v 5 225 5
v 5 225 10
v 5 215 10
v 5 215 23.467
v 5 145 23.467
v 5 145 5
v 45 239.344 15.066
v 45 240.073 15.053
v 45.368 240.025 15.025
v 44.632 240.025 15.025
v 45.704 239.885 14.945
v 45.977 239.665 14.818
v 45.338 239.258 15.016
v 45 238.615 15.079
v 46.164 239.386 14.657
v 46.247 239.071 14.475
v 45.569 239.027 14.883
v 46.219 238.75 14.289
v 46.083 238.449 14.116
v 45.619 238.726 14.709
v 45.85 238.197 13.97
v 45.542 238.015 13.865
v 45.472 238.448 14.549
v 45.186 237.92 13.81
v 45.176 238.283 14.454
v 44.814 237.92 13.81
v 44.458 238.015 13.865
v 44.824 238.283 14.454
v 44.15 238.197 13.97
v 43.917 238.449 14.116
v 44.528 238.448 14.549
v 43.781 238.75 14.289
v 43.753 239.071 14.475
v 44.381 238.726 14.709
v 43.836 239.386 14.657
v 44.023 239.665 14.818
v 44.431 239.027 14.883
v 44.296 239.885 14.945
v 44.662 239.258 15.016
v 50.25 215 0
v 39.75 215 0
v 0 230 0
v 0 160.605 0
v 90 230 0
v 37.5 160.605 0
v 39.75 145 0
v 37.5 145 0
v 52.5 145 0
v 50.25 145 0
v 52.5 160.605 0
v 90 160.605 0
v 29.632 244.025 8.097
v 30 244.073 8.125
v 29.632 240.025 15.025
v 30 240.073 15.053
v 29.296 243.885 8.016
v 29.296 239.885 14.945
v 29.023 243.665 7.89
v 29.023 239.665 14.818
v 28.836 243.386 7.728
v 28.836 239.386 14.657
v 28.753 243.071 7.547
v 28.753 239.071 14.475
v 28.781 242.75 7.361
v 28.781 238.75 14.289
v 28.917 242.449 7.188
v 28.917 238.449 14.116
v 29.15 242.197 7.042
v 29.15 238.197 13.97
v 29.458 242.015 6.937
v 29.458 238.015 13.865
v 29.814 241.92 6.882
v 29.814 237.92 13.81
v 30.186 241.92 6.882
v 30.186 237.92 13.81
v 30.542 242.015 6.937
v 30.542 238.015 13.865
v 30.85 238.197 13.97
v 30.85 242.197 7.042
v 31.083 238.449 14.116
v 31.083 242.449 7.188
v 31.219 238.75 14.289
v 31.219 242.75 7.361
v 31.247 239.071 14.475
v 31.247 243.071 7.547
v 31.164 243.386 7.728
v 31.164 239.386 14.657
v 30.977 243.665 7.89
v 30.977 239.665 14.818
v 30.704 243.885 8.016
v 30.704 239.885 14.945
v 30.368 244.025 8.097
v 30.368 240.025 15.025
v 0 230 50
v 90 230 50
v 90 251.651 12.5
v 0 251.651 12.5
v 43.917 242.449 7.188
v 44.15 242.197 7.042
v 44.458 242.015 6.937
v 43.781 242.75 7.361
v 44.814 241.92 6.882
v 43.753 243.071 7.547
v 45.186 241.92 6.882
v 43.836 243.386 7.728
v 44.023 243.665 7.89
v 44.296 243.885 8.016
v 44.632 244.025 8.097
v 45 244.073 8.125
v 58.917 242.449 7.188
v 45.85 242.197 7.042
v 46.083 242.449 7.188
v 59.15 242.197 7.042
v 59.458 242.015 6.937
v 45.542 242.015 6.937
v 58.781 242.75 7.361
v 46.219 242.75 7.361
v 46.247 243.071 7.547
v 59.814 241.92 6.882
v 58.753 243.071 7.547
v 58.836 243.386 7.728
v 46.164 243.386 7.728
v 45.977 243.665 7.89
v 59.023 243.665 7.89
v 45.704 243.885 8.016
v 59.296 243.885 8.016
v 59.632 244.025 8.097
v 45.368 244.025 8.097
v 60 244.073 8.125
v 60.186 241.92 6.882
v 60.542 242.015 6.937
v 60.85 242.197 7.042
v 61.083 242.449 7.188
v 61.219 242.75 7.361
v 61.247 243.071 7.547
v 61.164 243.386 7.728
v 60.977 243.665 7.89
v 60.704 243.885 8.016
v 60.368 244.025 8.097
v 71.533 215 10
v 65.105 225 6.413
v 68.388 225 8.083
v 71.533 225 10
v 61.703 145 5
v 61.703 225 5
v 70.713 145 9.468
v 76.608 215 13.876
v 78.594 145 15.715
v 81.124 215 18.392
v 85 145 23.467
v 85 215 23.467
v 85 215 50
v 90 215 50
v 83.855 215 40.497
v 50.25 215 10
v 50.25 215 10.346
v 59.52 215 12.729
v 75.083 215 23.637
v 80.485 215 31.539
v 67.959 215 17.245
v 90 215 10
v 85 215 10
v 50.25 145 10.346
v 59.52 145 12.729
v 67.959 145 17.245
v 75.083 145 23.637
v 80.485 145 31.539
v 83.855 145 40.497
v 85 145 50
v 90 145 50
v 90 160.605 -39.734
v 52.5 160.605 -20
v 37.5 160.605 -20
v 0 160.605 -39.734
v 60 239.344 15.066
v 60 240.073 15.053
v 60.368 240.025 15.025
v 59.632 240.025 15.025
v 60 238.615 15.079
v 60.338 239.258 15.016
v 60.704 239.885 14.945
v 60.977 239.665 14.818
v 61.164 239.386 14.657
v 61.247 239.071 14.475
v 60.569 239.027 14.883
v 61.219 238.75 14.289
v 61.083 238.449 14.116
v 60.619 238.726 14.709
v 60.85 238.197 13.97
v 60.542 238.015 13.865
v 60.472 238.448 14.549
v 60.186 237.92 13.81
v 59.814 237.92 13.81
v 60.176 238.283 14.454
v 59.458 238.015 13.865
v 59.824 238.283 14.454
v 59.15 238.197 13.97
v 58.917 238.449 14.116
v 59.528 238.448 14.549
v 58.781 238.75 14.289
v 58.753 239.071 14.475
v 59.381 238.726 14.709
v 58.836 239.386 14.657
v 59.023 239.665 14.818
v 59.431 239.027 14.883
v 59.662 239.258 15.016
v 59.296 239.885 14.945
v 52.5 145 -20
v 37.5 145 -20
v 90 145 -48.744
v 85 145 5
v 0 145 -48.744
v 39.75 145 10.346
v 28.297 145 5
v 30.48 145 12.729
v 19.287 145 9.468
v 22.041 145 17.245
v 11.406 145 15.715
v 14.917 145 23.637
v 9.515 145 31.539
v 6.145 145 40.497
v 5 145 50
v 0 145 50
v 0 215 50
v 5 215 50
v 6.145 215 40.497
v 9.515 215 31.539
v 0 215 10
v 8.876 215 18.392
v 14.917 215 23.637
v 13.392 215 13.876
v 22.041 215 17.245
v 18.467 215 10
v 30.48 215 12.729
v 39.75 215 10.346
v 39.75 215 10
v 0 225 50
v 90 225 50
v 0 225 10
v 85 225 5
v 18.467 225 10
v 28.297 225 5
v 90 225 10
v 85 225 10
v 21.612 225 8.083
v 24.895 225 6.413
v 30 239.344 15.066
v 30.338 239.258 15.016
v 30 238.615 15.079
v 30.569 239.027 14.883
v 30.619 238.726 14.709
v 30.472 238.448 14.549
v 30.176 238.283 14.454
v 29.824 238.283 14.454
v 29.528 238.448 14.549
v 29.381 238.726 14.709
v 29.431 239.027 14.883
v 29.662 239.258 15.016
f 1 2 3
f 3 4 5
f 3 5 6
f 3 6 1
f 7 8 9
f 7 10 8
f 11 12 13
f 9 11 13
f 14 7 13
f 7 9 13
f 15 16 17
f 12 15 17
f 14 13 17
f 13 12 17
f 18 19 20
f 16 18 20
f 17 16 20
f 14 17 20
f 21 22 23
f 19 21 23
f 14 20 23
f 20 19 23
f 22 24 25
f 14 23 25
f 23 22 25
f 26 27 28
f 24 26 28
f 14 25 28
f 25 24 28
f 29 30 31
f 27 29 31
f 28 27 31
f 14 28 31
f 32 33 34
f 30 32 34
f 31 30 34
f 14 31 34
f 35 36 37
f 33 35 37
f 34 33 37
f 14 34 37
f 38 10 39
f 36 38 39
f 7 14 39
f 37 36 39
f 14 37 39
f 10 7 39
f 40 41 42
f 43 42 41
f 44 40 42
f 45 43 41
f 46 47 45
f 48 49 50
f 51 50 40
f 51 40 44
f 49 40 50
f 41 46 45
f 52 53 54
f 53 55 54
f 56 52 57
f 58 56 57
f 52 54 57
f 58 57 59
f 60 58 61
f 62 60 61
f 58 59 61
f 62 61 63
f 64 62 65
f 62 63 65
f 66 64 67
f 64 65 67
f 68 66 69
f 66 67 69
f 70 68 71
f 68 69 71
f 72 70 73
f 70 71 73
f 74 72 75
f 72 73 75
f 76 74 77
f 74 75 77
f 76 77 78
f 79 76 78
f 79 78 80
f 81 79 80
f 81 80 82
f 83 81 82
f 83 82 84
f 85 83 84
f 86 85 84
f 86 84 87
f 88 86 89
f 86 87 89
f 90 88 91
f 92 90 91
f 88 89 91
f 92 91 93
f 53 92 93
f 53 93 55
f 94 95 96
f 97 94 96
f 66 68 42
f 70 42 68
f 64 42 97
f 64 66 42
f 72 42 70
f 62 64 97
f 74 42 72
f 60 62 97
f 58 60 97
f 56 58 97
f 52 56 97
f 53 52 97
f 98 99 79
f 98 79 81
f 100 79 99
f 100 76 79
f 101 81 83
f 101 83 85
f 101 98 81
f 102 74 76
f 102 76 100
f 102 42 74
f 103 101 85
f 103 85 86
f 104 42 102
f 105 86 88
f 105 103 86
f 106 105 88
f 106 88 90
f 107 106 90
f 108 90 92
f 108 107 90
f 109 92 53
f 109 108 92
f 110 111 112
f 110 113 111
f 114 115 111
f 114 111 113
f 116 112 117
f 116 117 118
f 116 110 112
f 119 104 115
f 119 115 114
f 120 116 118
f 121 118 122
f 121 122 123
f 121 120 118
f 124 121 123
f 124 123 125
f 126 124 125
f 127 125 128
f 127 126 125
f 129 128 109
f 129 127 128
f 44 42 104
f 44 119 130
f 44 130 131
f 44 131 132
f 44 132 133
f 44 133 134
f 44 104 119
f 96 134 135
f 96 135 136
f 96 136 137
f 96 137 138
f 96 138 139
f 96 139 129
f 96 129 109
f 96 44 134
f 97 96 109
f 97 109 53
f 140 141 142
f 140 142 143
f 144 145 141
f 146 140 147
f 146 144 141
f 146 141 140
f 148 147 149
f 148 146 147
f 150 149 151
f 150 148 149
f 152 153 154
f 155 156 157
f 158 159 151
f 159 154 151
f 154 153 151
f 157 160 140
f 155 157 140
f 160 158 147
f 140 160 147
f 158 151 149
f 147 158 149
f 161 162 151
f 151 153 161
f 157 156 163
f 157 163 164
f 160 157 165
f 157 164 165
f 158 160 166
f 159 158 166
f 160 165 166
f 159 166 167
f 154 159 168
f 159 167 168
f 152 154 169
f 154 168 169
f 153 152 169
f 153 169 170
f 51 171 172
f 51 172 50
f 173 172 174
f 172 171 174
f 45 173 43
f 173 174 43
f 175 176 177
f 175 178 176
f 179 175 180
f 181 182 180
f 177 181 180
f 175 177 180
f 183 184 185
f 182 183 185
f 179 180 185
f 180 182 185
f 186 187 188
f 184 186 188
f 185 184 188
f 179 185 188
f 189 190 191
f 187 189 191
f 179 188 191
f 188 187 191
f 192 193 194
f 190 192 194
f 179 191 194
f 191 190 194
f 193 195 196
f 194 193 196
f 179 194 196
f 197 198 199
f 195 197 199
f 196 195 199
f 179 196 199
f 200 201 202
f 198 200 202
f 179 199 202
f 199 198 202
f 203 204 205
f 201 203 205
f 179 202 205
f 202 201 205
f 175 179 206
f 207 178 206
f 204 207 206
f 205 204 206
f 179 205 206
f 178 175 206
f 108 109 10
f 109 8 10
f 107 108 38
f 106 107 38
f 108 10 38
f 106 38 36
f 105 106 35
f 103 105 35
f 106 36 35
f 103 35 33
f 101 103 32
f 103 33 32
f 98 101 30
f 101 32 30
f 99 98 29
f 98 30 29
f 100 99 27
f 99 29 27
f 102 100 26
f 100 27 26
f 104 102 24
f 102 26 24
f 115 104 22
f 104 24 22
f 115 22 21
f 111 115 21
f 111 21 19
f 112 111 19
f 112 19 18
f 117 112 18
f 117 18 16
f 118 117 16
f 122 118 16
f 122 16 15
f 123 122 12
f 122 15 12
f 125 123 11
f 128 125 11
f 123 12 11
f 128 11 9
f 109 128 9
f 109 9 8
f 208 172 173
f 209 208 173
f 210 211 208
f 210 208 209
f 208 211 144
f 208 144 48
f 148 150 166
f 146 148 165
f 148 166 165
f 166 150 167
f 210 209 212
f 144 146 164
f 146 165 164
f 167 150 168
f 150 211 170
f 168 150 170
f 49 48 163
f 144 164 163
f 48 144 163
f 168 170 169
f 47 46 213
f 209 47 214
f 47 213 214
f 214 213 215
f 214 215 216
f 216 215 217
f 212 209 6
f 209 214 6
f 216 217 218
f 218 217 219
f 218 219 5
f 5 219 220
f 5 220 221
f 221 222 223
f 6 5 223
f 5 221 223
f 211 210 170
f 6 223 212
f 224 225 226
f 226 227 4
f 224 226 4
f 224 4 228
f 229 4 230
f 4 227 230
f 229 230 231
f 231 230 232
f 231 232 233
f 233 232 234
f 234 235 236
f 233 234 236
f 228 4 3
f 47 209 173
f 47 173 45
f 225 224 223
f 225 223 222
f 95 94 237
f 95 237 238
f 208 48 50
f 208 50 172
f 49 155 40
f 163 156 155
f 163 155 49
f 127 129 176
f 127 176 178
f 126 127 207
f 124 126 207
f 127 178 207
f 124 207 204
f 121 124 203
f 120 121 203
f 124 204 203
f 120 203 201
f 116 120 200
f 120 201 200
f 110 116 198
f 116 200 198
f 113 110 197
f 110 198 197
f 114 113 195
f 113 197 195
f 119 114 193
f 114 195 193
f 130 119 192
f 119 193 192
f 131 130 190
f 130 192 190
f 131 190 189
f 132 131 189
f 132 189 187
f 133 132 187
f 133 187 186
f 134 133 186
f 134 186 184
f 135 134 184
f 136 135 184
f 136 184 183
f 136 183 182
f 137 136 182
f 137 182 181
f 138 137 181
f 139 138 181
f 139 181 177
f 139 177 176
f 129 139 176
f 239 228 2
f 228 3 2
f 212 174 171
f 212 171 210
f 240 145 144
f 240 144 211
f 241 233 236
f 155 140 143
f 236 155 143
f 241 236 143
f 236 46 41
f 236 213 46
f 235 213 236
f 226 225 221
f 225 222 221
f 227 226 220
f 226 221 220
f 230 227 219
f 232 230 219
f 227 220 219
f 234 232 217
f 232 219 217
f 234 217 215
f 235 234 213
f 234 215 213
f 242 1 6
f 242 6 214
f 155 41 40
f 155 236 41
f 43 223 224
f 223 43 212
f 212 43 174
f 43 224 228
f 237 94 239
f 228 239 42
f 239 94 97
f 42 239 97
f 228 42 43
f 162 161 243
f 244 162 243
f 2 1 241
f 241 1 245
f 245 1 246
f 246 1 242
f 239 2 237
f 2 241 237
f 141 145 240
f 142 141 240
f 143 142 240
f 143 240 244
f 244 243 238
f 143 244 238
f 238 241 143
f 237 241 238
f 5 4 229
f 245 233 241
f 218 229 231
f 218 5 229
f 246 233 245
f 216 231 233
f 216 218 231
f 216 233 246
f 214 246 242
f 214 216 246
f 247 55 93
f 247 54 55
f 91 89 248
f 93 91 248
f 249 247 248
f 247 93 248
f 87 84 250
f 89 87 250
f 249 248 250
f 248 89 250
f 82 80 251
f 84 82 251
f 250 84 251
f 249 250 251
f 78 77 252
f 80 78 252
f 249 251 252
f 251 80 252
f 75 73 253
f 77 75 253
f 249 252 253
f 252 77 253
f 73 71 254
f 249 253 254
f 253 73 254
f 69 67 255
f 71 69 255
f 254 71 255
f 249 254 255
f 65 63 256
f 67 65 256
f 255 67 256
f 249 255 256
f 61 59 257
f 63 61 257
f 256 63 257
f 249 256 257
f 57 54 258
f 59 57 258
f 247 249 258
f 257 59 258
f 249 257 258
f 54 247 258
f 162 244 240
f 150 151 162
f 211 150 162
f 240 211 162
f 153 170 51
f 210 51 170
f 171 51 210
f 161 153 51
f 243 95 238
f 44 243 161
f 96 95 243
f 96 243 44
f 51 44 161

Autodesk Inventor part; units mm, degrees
ref_plane "YZ Plane" through (0, 0, 0) normal (1, 0, 0) x (0, 1, 0)
ref_plane "XZ Plane" through (0, 0, 0) normal (0, 1, 0) x (-1, 0, 0)
ref_plane "XY Plane" through (0, 0, 0) normal (0, 0, 1) x (1, 0, 0)
sketch "スケッチ1" plane through (0, 0, 0) normal (0, 1, 0) x (-1, 0, 0)
  line L0 (0, 0) -> (-90, 0)
  line L1 (-90, 0) -> (-90, 50)
  line L2 (0, 50) -> (0, 0)
  line L3 (0, 0) -> (-5, 0)
  line L4 (-5, 0) -> (-5, 50)
  line L5 (-5, 0) -> (-90, 0)
  line L6 (-90, 0) -> (-85, 0)
  line L7 (-85, 0) -> (-85, 50)
  arc A0 (-85, 50) -> (-5, 50) centre (-45, 50) ccw
  line L8 (0, 0) -> (0, 10)
  line L9 (0, 10) -> (-90, 10)
  circle A1 centre (-45, 50) radius 45
  line L10 (-90, 5) -> (0, 5)
  line L11 (-90, 50) -> (-85, 50)
  line L12 (-5, 50) -> (0, 50)
  line L13 (0, 0) -> (-90, 0)
  line L14 (-90, 0) -> (-90, 5)
  line L15 (-90, 5) -> (0, 5)
  line L16 (0, 5) -> (0, 0)
  dimension "d0" = 90
  dimension "d1" = 50
  dimension "d2" = 5
  dimension "d3" = 85
  dimension "d4" = 5
  dimension "d5" = 80
  dimension "d6" = 10
  dimension "d7" = 90
extrude "押し出し1" add sketch "スケッチ1" along normal blind 230 contours L0 L4 L10 L2 | L0 L7 L10 L4 | L10 L4 L9 L2 | L0 L1 L10 L7 | L10 A1 L9 L4 | L9 L4 A1 L2 | L10 L1 L9 L7 | L7 L9 A1 L10 | L9 A1 L4 | A1 L9 | A1 L4 L12 | L9 L1 A1 L7 | L7 A1 L9 | A1 L9 A0 L4 | A1 L7 A0 L9 | L11 L7 A1
sketch "スケッチ2" plane through (0, 0, 0) normal (0, -1, 0) x (1, 0, 0)
  line L0 (0, 0) -> (0, 50) projected
  line L1 (90, 0) -> (0, 0) projected
  line L2 (90, 50) -> (90, 0) projected
  line L3 (85, 50) -> (90, 50) projected
  arc A0 (5, 50) -> (85, 50) centre (45, 50) ccw projected
  line L4 (0, 50) -> (5, 50) projected
  arc A1 (5, 23.467) -> (85, 23.467) centre (45, 50) ccw
  line L5 (0, 5) -> (90, 5)
  line L6 (5, 23.467) -> (5, 5)
  line L7 (85, 23.467) -> (85, 5)
  dimension "d29" = 48
extrude "押し出し2" cut sketch "スケッチ2" against normal blind 225 contours L6 A1 L5 | L5 A1 L7
sketch "スケッチ3" plane through (0, 230, 0) normal (0, 1, 0) x (1, 0, 0)
  arc A0 (85, -50) -> (5, -50) centre (45, -50) ccw projected
  line L0 (90, -50) -> (90, 0) projected
  line L1 (0, -50) -> (5, -50) projected
  arc A1 (85, -50) -> (5, -50) centre (45, -50) ccw
  line L2 (5, -50) -> (85, -50)
extrude "押し出し3" add sketch "スケッチ3" against normal blind 5
sketch "スケッチ4" plane through (90, 0, 50) normal (1, 0, 0) x (0, 0, -1)
  line L0 (0, 0) -> (50, 0) projected
  line L1 (0, 0) -> (0, 230) projected
  line L2 (25, 0) -> (25, 65)
  line L3 (25, 65) -> (25, 75)
  line L4 (25, 75) -> (25, 215)
  line L5 (25, 215) -> (25, 225)
  line L6 (0, 65) -> (40, 65)
  line L7 (40, 65) -> (40, 75)
  line L8 (40, 75) -> (0, 75)
  line L9 (0, 75) -> (0, 65)
  line L10 (0, 215) -> (40, 215)
  line L11 (40, 215) -> (40, 225)
  line L12 (40, 225) -> (0, 225)
  line L13 (0, 225) -> (0, 215)
  dimension "d16" = 65
  dimension "d17" = 10
  dimension "d18" = 140
  dimension "d19" = 10
  dimension "d20" = 40
extrude "押し出し4" cut sketch "スケッチ4" against normal blind 90 contours L1 L8 L3 L6 | L3 L8 L7 L6 | L1 L12 L5 L10 | L5 L12 L11 L10
sketch "スケッチ6" plane through (90, 0, 50) normal (1, 0, 0) x (0, 0, -1)
  line L0 (0, 230) -> (50, 230) projected
  line L1 (50, 230) -> (37.5, 251.6506)
  line L2 (50, 230) -> (110, 230) construction
  line L3 (0, 230) -> (37.5, 251.6506)
  line L4 (0, 230) -> (43.3013, 230) construction
  dimension "d32" = 120
  dimension "d33" = 30
extrude "押し出し6" add sketch "スケッチ6" against normal blind 90
sketch "スケッチ9" plane through (0, 0, 0) normal (-1, 0, 0) x (0, 0, 1)
  line L0 (10, 225) -> (50, 225) projected
  line L1 (50, 225) -> (50, 230) projected
  line L2 (50, 230) -> (12.5, 251.6506) projected
  line L3 (12.5, 251.6506) -> (0, 230) projected
  line L4 (0, 0) -> (0, 230) projected
  line L5 (0, 0) -> (50, 0) projected
  line L6 (50, 0) -> (50, 65) projected
  line L7 (50, 65) -> (10, 65) projected
  line L8 (10, 65) -> (10, 75) projected
  line L9 (10, 75) -> (50, 75) projected
  line L10 (50, 75) -> (50, 215) projected
  line L11 (50, 215) -> (10, 215) projected
  line L12 (10, 215) -> (10, 225) projected
  line L13 (12.5, 251.6506) -> (0, 230)
  line L14 (0, 230) -> (-132.7906, 0)
  line L15 (0, 145) -> (-49.0748, 145)
  line L16 (0, 115) -> (-66.3953, 115)
  dimension "d45" = 30
sketch "スケッチ10" plane through (0, 0, 0) normal (-1, 0, 0) x (0, 0, 1)
  line L0 (10, 225) -> (50, 225) projected
  line L1 (50, 225) -> (50, 230) projected
  line L2 (50, 230) -> (12.5, 251.6506) projected
  line L3 (12.5, 251.6506) -> (0, 230) projected
  line L4 (0, 0) -> (0, 230) projected
  line L5 (0, 0) -> (50, 0) projected
  line L6 (50, 0) -> (50, 65) projected
  line L7 (50, 65) -> (10, 65) projected
  line L8 (10, 65) -> (10, 75) projected
  line L9 (10, 75) -> (50, 75) projected
  line L10 (50, 75) -> (50, 215) projected
  line L11 (50, 215) -> (10, 215) projected
  line L12 (10, 215) -> (10, 225) projected
  line L13 (12.5, 251.6506) -> (-87.5, 78.4456)
  line L14 (-87.5, 78.4456) -> (50, 0)
sketch "スケッチ11" plane through (90, 230, 0) normal (0, 0.5, -0.866) x (-1, 0, 0)
  line L0 (0, 25) -> (90, 25) projected
  line L1 (45, 25) -> (45, 15)
  line L2 (45, 15) -> (60, 15)
  line L3 (60, 15) -> (30, 15)
  point P0 (90, -199.1858)
  dimension "d49" = 10
  dimension "d50" = 15
  dimension "d51" = 30
hole "穴1" at (45, 242.9904, 7.5) at (30, 242.9904, 7.5) at (60, 242.9904, 7.5) direction (0, -0.5, 0.866) diameter 2.5 depth 8 tip angle 118
sketch "スケッチ18" plane through (90, 65, 10) normal (0, 0, 1) x (1, 0, 0)
  line L0 (0, 10) -> (-5, 10) projected
  line L1 (0, 10) -> (-90, 10)
  line L2 (-90, 10) -> (-90, 150)
  line L3 (-90, 150) -> (0, 150)
  line L4 (0, 150) -> (0, 10)
  line L5 (-45, 150) -> (-45, 10)
  line L6 (-53.1517, 150) -> (-27.646, 150)
  line L7 (-27.646, 150) -> (-27.646, 10)
  line L8 (-27.646, 10) -> (-53.1517, 10)
  line L9 (-53.1517, 10) -> (-53.1517, 150)
  line L10 (-45, 10) -> (-39.75, 10)
  line L11 (-45, 150) -> (-50.25, 150)
  line L12 (-50.25, 150) -> (-39.75, 150)
  line L13 (-39.75, 150) -> (-39.75, 10)
  line L14 (-39.75, 10) -> (-50.25, 10)
  line L15 (-50.25, 10) -> (-50.25, 150)
  point P0 (-90, -65)
  dimension "d76" = 140
  dimension "d77" = 5.25
  dimension "d78" = 5.25
extrude "押し出し12" cut sketch "スケッチ18" against normal blind 10 and the other way blind 5 contours L1 L5 L3 L13 | L1 L15 L3 L5
sketch "スケッチ19" plane through (0, 0, 0) normal (-1, 0, 0) x (0, 0, 1)
  line L0 (10, 225) -> (50, 225) projected
  line L1 (50, 225) -> (50, 230) projected
  line L2 (50, 230) -> (12.5, 251.6506) projected
  line L3 (12.5, 251.6506) -> (0, 230) projected
  line L4 (0, 0) -> (0, 230) projected
  line L5 (0, 0) -> (50, 0) projected
  line L6 (50, 0) -> (50, 65) projected
  line L7 (50, 65) -> (10, 65) projected
  line L8 (10, 65) -> (10, 75) projected
  line L9 (10, 75) -> (50, 75) projected
  line L10 (50, 75) -> (50, 215) projected
  line L11 (50, 215) -> (10, 215) projected
  line L12 (10, 215) -> (10, 225) projected
  line L13 (0, 230) -> (-23.825, 188.7339)
  line L14 (-23.825, 188.7339) -> (-3.4734, 176.9839)
  circle A0 centre (-3.4734, 176.9839) radius 16
  circle A1 centre (-3.4734, 176.9839) radius 3
  dimension "d83" = 47.65
  dimension "d84" = 23.5
  dimension "d85" = 32
  dimension "d86" = 6
sketch "スケッチ20" plane through (90, 230, 0) normal (0, 0.5, -0.866) x (-1, 0, 0)
  circle A0 centre (60, 15) radius 1.25 projected
  circle A1 centre (45, 15) radius 1.25 projected
  circle A2 centre (30, 15) radius 1.25 projected
  line L0 (0, 0) -> (0, 25) projected
  line L1 (0, 0) -> (90, 0) projected
  line L2 (90, 25) -> (90, 0) projected
  line L3 (0, 25) -> (90, 25) projected
  point P0 (90, -199.1858)
ref_plane "作業平面5" through (90, 45, 50) normal (0, 1, 0) x (1, 0, 0)
sketch "スケッチ21" plane through (90, 45, 50) normal (0, 1, 0) x (1, 0, 0)
  line L0 (0, 0) -> (-101.8599, 0)
  line L1 (-101.8599, 0) -> (-101.8599, 60.1995)
  line L2 (-101.8599, 60.1995) -> (0, 60.1995)
  line L3 (0, 60.1995) -> (0, 0)
  point P0 (-90, 50)
extrude "押し出し13" cut sketch "スケッチ21" against normal blind 50
ref_plane "作業平面6" through (85, 145, 23.467) normal (0, 1, 0) x (-1, 0, 0)
sketch "スケッチ22" plane through (0, 75, 50) normal (-1, 0, 0) x (0, 0, 1)
  line L0 (-37.5, 176.6506) -> (-50, 155) projected
  line L1 (-50, -30) -> (-50, 155) projected
  line L2 (-98.8395, 70.6051) -> (-50, 70.6051)
  line L3 (-107.0544, 55.6051) -> (-50, 55.6051)
  line L4 (-89.7339, 85.6051) -> (-50, 85.6051)
  line L5 (-89.7339, 85.6051) -> (-107.0544, 55.6051)
  line L6 (-50, 55.6051) -> (-50, 85.6051)
  point P0 (-50, -75)
  dimension "d90" = 30
  dimension "d92" = 15
extrude "押し出し14" add sketch "スケッチ22" against normal blind 90
sketch "スケッチ23" plane through (0, 130.6051, -57.0544) normal (0, -1, 0) x (1, 0, 0)
  line L0 (0, 0) -> (90, 0) projected
  line L1 (39.75, 57.0544) -> (50.25, 57.0544) projected
  line L2 (45, 57.0544) -> (45, 0)
  line L3 (37.5, 57.0544) -> (52.5, 57.0544)
  line L4 (52.5, 57.0544) -> (52.5, 0)
  line L5 (52.5, 0) -> (37.5, 0)
  line L6 (37.5, 0) -> (37.5, 57.0544)
  line L7 (37.5, 57.0544) -> (52.5, 0) construction
  line L8 (52.5, 57.0544) -> (37.5, 0) construction
  line L9 (37.5, 57.0544) -> (52.5, 57.0544)
  line L10 (52.5, 57.0544) -> (52.5, 37.0544)
  line L11 (52.5, 37.0544) -> (37.5, 37.0544)
  line L12 (37.5, 37.0544) -> (37.5, 57.0544)
  point P0 (45, 28.5272)
  dimension "d95" = 15
  dimension "d96" = 20
extrude "押し出し15" cut sketch "スケッチ23" against normal blind 90 contours L6 L3 L1 L2 L11 | L2 L1 L3 L4 L11
sketch "スケッチ24" plane through (90, 230, 0) normal (0, 0, -1) x (-1, 0, 0)
  line L0 (50.25, -15) -> (50.25, -155) projected
  line L1 (50.25, -155) -> (39.75, -155) projected
  line L2 (39.75, -155) -> (39.75, -15) projected
  line L3 (39.75, -15) -> (50.25, -15) projected
  line L4 (52.5, -99.3949) -> (52.5, -69.3949) projected
  line L5 (52.5, -69.3949) -> (90, -69.3949) projected
  line L6 (90, -69.3949) -> (90, 0) projected
  line L7 (0, 0) -> (90, 0) projected
  line L8 (0, -69.3949) -> (0, 0) projected
  line L9 (0, -69.3949) -> (37.5, -69.3949) projected
  line L10 (37.5, -99.3949) -> (37.5, -69.3949) projected
  line L11 (37.5, -99.3949) -> (0, -99.3949) projected
  line L12 (0, -185) -> (0, -99.3949) projected
  line L13 (0, -185) -> (90, -185) projected
  line L14 (90, -185) -> (90, -99.3949) projected
  line L15 (90, -99.3949) -> (52.5, -99.3949) projected
  line L16 (0, -99.3949) -> (90, -99.3949)
  line L17 (90, -99.3949) -> (90, -69.3949)
  line L18 (90, -69.3949) -> (0, -69.3949)
  line L19 (0, -69.3949) -> (0, -99.3949)
  line L20 (-5, -64.3949) -> (95, -64.3949)
  line L21 (95, -64.3949) -> (95, -104.3949)
  line L22 (95, -104.3949) -> (-5, -104.3949)
  line L23 (-5, -104.3949) -> (-5, -64.3949)
  line L24 (-5, -64.3949) -> (95, -104.3949) construction
  line L25 (95, -64.3949) -> (-5, -104.3949) construction
  line L26 (0, -69.3949) -> (90, -69.3949)
  line L27 (90, -69.3949) -> (90, -99.3949)
  line L28 (90, -99.3949) -> (0, -99.3949)
  line L29 (0, -99.3949) -> (0, -69.3949)
  line L30 (0, -69.3949) -> (90, -99.3949) construction
  line L31 (90, -69.3949) -> (0, -99.3949) construction
  point P0 (90, -230)
  point P1 (45, -84.3949)
  dimension "d99" = 100
  dimension "d100" = 40
sketch "スケッチ25" plane through (90, 160.6051, -39.7339) normal (0, 0.5, -0.866) x (-1, 0, 0)
  line L0 (90, 0) -> (90, -34.641) projected
  line L1 (90, 0) -> (0, 0) projected
  line L2 (0, -34.641) -> (0, 0) projected
  line L3 (90, -34.641) -> (0, -34.641) projected
  point P0 (90, -119.2211)
sketch "スケッチ26" plane through (85, 145, 23.467) normal (0, 1, 0) x (-1, 0, 0)
  line L0 (125.1914, -92.9646) -> (-58.6843, -92.9646)
  line L1 (-58.6843, -92.9646) -> (-58.6843, 63.112)
  line L2 (-58.6843, 63.112) -> (125.1914, 63.112)
  line L3 (125.1914, 63.112) -> (125.1914, -92.9646)
  point P0 (85, -23.467)
extrude "押し出し16" cut sketch "スケッチ26" against normal blind 110
properties part number "知能ロボコン発射台２" material "ABS プラスチック"
